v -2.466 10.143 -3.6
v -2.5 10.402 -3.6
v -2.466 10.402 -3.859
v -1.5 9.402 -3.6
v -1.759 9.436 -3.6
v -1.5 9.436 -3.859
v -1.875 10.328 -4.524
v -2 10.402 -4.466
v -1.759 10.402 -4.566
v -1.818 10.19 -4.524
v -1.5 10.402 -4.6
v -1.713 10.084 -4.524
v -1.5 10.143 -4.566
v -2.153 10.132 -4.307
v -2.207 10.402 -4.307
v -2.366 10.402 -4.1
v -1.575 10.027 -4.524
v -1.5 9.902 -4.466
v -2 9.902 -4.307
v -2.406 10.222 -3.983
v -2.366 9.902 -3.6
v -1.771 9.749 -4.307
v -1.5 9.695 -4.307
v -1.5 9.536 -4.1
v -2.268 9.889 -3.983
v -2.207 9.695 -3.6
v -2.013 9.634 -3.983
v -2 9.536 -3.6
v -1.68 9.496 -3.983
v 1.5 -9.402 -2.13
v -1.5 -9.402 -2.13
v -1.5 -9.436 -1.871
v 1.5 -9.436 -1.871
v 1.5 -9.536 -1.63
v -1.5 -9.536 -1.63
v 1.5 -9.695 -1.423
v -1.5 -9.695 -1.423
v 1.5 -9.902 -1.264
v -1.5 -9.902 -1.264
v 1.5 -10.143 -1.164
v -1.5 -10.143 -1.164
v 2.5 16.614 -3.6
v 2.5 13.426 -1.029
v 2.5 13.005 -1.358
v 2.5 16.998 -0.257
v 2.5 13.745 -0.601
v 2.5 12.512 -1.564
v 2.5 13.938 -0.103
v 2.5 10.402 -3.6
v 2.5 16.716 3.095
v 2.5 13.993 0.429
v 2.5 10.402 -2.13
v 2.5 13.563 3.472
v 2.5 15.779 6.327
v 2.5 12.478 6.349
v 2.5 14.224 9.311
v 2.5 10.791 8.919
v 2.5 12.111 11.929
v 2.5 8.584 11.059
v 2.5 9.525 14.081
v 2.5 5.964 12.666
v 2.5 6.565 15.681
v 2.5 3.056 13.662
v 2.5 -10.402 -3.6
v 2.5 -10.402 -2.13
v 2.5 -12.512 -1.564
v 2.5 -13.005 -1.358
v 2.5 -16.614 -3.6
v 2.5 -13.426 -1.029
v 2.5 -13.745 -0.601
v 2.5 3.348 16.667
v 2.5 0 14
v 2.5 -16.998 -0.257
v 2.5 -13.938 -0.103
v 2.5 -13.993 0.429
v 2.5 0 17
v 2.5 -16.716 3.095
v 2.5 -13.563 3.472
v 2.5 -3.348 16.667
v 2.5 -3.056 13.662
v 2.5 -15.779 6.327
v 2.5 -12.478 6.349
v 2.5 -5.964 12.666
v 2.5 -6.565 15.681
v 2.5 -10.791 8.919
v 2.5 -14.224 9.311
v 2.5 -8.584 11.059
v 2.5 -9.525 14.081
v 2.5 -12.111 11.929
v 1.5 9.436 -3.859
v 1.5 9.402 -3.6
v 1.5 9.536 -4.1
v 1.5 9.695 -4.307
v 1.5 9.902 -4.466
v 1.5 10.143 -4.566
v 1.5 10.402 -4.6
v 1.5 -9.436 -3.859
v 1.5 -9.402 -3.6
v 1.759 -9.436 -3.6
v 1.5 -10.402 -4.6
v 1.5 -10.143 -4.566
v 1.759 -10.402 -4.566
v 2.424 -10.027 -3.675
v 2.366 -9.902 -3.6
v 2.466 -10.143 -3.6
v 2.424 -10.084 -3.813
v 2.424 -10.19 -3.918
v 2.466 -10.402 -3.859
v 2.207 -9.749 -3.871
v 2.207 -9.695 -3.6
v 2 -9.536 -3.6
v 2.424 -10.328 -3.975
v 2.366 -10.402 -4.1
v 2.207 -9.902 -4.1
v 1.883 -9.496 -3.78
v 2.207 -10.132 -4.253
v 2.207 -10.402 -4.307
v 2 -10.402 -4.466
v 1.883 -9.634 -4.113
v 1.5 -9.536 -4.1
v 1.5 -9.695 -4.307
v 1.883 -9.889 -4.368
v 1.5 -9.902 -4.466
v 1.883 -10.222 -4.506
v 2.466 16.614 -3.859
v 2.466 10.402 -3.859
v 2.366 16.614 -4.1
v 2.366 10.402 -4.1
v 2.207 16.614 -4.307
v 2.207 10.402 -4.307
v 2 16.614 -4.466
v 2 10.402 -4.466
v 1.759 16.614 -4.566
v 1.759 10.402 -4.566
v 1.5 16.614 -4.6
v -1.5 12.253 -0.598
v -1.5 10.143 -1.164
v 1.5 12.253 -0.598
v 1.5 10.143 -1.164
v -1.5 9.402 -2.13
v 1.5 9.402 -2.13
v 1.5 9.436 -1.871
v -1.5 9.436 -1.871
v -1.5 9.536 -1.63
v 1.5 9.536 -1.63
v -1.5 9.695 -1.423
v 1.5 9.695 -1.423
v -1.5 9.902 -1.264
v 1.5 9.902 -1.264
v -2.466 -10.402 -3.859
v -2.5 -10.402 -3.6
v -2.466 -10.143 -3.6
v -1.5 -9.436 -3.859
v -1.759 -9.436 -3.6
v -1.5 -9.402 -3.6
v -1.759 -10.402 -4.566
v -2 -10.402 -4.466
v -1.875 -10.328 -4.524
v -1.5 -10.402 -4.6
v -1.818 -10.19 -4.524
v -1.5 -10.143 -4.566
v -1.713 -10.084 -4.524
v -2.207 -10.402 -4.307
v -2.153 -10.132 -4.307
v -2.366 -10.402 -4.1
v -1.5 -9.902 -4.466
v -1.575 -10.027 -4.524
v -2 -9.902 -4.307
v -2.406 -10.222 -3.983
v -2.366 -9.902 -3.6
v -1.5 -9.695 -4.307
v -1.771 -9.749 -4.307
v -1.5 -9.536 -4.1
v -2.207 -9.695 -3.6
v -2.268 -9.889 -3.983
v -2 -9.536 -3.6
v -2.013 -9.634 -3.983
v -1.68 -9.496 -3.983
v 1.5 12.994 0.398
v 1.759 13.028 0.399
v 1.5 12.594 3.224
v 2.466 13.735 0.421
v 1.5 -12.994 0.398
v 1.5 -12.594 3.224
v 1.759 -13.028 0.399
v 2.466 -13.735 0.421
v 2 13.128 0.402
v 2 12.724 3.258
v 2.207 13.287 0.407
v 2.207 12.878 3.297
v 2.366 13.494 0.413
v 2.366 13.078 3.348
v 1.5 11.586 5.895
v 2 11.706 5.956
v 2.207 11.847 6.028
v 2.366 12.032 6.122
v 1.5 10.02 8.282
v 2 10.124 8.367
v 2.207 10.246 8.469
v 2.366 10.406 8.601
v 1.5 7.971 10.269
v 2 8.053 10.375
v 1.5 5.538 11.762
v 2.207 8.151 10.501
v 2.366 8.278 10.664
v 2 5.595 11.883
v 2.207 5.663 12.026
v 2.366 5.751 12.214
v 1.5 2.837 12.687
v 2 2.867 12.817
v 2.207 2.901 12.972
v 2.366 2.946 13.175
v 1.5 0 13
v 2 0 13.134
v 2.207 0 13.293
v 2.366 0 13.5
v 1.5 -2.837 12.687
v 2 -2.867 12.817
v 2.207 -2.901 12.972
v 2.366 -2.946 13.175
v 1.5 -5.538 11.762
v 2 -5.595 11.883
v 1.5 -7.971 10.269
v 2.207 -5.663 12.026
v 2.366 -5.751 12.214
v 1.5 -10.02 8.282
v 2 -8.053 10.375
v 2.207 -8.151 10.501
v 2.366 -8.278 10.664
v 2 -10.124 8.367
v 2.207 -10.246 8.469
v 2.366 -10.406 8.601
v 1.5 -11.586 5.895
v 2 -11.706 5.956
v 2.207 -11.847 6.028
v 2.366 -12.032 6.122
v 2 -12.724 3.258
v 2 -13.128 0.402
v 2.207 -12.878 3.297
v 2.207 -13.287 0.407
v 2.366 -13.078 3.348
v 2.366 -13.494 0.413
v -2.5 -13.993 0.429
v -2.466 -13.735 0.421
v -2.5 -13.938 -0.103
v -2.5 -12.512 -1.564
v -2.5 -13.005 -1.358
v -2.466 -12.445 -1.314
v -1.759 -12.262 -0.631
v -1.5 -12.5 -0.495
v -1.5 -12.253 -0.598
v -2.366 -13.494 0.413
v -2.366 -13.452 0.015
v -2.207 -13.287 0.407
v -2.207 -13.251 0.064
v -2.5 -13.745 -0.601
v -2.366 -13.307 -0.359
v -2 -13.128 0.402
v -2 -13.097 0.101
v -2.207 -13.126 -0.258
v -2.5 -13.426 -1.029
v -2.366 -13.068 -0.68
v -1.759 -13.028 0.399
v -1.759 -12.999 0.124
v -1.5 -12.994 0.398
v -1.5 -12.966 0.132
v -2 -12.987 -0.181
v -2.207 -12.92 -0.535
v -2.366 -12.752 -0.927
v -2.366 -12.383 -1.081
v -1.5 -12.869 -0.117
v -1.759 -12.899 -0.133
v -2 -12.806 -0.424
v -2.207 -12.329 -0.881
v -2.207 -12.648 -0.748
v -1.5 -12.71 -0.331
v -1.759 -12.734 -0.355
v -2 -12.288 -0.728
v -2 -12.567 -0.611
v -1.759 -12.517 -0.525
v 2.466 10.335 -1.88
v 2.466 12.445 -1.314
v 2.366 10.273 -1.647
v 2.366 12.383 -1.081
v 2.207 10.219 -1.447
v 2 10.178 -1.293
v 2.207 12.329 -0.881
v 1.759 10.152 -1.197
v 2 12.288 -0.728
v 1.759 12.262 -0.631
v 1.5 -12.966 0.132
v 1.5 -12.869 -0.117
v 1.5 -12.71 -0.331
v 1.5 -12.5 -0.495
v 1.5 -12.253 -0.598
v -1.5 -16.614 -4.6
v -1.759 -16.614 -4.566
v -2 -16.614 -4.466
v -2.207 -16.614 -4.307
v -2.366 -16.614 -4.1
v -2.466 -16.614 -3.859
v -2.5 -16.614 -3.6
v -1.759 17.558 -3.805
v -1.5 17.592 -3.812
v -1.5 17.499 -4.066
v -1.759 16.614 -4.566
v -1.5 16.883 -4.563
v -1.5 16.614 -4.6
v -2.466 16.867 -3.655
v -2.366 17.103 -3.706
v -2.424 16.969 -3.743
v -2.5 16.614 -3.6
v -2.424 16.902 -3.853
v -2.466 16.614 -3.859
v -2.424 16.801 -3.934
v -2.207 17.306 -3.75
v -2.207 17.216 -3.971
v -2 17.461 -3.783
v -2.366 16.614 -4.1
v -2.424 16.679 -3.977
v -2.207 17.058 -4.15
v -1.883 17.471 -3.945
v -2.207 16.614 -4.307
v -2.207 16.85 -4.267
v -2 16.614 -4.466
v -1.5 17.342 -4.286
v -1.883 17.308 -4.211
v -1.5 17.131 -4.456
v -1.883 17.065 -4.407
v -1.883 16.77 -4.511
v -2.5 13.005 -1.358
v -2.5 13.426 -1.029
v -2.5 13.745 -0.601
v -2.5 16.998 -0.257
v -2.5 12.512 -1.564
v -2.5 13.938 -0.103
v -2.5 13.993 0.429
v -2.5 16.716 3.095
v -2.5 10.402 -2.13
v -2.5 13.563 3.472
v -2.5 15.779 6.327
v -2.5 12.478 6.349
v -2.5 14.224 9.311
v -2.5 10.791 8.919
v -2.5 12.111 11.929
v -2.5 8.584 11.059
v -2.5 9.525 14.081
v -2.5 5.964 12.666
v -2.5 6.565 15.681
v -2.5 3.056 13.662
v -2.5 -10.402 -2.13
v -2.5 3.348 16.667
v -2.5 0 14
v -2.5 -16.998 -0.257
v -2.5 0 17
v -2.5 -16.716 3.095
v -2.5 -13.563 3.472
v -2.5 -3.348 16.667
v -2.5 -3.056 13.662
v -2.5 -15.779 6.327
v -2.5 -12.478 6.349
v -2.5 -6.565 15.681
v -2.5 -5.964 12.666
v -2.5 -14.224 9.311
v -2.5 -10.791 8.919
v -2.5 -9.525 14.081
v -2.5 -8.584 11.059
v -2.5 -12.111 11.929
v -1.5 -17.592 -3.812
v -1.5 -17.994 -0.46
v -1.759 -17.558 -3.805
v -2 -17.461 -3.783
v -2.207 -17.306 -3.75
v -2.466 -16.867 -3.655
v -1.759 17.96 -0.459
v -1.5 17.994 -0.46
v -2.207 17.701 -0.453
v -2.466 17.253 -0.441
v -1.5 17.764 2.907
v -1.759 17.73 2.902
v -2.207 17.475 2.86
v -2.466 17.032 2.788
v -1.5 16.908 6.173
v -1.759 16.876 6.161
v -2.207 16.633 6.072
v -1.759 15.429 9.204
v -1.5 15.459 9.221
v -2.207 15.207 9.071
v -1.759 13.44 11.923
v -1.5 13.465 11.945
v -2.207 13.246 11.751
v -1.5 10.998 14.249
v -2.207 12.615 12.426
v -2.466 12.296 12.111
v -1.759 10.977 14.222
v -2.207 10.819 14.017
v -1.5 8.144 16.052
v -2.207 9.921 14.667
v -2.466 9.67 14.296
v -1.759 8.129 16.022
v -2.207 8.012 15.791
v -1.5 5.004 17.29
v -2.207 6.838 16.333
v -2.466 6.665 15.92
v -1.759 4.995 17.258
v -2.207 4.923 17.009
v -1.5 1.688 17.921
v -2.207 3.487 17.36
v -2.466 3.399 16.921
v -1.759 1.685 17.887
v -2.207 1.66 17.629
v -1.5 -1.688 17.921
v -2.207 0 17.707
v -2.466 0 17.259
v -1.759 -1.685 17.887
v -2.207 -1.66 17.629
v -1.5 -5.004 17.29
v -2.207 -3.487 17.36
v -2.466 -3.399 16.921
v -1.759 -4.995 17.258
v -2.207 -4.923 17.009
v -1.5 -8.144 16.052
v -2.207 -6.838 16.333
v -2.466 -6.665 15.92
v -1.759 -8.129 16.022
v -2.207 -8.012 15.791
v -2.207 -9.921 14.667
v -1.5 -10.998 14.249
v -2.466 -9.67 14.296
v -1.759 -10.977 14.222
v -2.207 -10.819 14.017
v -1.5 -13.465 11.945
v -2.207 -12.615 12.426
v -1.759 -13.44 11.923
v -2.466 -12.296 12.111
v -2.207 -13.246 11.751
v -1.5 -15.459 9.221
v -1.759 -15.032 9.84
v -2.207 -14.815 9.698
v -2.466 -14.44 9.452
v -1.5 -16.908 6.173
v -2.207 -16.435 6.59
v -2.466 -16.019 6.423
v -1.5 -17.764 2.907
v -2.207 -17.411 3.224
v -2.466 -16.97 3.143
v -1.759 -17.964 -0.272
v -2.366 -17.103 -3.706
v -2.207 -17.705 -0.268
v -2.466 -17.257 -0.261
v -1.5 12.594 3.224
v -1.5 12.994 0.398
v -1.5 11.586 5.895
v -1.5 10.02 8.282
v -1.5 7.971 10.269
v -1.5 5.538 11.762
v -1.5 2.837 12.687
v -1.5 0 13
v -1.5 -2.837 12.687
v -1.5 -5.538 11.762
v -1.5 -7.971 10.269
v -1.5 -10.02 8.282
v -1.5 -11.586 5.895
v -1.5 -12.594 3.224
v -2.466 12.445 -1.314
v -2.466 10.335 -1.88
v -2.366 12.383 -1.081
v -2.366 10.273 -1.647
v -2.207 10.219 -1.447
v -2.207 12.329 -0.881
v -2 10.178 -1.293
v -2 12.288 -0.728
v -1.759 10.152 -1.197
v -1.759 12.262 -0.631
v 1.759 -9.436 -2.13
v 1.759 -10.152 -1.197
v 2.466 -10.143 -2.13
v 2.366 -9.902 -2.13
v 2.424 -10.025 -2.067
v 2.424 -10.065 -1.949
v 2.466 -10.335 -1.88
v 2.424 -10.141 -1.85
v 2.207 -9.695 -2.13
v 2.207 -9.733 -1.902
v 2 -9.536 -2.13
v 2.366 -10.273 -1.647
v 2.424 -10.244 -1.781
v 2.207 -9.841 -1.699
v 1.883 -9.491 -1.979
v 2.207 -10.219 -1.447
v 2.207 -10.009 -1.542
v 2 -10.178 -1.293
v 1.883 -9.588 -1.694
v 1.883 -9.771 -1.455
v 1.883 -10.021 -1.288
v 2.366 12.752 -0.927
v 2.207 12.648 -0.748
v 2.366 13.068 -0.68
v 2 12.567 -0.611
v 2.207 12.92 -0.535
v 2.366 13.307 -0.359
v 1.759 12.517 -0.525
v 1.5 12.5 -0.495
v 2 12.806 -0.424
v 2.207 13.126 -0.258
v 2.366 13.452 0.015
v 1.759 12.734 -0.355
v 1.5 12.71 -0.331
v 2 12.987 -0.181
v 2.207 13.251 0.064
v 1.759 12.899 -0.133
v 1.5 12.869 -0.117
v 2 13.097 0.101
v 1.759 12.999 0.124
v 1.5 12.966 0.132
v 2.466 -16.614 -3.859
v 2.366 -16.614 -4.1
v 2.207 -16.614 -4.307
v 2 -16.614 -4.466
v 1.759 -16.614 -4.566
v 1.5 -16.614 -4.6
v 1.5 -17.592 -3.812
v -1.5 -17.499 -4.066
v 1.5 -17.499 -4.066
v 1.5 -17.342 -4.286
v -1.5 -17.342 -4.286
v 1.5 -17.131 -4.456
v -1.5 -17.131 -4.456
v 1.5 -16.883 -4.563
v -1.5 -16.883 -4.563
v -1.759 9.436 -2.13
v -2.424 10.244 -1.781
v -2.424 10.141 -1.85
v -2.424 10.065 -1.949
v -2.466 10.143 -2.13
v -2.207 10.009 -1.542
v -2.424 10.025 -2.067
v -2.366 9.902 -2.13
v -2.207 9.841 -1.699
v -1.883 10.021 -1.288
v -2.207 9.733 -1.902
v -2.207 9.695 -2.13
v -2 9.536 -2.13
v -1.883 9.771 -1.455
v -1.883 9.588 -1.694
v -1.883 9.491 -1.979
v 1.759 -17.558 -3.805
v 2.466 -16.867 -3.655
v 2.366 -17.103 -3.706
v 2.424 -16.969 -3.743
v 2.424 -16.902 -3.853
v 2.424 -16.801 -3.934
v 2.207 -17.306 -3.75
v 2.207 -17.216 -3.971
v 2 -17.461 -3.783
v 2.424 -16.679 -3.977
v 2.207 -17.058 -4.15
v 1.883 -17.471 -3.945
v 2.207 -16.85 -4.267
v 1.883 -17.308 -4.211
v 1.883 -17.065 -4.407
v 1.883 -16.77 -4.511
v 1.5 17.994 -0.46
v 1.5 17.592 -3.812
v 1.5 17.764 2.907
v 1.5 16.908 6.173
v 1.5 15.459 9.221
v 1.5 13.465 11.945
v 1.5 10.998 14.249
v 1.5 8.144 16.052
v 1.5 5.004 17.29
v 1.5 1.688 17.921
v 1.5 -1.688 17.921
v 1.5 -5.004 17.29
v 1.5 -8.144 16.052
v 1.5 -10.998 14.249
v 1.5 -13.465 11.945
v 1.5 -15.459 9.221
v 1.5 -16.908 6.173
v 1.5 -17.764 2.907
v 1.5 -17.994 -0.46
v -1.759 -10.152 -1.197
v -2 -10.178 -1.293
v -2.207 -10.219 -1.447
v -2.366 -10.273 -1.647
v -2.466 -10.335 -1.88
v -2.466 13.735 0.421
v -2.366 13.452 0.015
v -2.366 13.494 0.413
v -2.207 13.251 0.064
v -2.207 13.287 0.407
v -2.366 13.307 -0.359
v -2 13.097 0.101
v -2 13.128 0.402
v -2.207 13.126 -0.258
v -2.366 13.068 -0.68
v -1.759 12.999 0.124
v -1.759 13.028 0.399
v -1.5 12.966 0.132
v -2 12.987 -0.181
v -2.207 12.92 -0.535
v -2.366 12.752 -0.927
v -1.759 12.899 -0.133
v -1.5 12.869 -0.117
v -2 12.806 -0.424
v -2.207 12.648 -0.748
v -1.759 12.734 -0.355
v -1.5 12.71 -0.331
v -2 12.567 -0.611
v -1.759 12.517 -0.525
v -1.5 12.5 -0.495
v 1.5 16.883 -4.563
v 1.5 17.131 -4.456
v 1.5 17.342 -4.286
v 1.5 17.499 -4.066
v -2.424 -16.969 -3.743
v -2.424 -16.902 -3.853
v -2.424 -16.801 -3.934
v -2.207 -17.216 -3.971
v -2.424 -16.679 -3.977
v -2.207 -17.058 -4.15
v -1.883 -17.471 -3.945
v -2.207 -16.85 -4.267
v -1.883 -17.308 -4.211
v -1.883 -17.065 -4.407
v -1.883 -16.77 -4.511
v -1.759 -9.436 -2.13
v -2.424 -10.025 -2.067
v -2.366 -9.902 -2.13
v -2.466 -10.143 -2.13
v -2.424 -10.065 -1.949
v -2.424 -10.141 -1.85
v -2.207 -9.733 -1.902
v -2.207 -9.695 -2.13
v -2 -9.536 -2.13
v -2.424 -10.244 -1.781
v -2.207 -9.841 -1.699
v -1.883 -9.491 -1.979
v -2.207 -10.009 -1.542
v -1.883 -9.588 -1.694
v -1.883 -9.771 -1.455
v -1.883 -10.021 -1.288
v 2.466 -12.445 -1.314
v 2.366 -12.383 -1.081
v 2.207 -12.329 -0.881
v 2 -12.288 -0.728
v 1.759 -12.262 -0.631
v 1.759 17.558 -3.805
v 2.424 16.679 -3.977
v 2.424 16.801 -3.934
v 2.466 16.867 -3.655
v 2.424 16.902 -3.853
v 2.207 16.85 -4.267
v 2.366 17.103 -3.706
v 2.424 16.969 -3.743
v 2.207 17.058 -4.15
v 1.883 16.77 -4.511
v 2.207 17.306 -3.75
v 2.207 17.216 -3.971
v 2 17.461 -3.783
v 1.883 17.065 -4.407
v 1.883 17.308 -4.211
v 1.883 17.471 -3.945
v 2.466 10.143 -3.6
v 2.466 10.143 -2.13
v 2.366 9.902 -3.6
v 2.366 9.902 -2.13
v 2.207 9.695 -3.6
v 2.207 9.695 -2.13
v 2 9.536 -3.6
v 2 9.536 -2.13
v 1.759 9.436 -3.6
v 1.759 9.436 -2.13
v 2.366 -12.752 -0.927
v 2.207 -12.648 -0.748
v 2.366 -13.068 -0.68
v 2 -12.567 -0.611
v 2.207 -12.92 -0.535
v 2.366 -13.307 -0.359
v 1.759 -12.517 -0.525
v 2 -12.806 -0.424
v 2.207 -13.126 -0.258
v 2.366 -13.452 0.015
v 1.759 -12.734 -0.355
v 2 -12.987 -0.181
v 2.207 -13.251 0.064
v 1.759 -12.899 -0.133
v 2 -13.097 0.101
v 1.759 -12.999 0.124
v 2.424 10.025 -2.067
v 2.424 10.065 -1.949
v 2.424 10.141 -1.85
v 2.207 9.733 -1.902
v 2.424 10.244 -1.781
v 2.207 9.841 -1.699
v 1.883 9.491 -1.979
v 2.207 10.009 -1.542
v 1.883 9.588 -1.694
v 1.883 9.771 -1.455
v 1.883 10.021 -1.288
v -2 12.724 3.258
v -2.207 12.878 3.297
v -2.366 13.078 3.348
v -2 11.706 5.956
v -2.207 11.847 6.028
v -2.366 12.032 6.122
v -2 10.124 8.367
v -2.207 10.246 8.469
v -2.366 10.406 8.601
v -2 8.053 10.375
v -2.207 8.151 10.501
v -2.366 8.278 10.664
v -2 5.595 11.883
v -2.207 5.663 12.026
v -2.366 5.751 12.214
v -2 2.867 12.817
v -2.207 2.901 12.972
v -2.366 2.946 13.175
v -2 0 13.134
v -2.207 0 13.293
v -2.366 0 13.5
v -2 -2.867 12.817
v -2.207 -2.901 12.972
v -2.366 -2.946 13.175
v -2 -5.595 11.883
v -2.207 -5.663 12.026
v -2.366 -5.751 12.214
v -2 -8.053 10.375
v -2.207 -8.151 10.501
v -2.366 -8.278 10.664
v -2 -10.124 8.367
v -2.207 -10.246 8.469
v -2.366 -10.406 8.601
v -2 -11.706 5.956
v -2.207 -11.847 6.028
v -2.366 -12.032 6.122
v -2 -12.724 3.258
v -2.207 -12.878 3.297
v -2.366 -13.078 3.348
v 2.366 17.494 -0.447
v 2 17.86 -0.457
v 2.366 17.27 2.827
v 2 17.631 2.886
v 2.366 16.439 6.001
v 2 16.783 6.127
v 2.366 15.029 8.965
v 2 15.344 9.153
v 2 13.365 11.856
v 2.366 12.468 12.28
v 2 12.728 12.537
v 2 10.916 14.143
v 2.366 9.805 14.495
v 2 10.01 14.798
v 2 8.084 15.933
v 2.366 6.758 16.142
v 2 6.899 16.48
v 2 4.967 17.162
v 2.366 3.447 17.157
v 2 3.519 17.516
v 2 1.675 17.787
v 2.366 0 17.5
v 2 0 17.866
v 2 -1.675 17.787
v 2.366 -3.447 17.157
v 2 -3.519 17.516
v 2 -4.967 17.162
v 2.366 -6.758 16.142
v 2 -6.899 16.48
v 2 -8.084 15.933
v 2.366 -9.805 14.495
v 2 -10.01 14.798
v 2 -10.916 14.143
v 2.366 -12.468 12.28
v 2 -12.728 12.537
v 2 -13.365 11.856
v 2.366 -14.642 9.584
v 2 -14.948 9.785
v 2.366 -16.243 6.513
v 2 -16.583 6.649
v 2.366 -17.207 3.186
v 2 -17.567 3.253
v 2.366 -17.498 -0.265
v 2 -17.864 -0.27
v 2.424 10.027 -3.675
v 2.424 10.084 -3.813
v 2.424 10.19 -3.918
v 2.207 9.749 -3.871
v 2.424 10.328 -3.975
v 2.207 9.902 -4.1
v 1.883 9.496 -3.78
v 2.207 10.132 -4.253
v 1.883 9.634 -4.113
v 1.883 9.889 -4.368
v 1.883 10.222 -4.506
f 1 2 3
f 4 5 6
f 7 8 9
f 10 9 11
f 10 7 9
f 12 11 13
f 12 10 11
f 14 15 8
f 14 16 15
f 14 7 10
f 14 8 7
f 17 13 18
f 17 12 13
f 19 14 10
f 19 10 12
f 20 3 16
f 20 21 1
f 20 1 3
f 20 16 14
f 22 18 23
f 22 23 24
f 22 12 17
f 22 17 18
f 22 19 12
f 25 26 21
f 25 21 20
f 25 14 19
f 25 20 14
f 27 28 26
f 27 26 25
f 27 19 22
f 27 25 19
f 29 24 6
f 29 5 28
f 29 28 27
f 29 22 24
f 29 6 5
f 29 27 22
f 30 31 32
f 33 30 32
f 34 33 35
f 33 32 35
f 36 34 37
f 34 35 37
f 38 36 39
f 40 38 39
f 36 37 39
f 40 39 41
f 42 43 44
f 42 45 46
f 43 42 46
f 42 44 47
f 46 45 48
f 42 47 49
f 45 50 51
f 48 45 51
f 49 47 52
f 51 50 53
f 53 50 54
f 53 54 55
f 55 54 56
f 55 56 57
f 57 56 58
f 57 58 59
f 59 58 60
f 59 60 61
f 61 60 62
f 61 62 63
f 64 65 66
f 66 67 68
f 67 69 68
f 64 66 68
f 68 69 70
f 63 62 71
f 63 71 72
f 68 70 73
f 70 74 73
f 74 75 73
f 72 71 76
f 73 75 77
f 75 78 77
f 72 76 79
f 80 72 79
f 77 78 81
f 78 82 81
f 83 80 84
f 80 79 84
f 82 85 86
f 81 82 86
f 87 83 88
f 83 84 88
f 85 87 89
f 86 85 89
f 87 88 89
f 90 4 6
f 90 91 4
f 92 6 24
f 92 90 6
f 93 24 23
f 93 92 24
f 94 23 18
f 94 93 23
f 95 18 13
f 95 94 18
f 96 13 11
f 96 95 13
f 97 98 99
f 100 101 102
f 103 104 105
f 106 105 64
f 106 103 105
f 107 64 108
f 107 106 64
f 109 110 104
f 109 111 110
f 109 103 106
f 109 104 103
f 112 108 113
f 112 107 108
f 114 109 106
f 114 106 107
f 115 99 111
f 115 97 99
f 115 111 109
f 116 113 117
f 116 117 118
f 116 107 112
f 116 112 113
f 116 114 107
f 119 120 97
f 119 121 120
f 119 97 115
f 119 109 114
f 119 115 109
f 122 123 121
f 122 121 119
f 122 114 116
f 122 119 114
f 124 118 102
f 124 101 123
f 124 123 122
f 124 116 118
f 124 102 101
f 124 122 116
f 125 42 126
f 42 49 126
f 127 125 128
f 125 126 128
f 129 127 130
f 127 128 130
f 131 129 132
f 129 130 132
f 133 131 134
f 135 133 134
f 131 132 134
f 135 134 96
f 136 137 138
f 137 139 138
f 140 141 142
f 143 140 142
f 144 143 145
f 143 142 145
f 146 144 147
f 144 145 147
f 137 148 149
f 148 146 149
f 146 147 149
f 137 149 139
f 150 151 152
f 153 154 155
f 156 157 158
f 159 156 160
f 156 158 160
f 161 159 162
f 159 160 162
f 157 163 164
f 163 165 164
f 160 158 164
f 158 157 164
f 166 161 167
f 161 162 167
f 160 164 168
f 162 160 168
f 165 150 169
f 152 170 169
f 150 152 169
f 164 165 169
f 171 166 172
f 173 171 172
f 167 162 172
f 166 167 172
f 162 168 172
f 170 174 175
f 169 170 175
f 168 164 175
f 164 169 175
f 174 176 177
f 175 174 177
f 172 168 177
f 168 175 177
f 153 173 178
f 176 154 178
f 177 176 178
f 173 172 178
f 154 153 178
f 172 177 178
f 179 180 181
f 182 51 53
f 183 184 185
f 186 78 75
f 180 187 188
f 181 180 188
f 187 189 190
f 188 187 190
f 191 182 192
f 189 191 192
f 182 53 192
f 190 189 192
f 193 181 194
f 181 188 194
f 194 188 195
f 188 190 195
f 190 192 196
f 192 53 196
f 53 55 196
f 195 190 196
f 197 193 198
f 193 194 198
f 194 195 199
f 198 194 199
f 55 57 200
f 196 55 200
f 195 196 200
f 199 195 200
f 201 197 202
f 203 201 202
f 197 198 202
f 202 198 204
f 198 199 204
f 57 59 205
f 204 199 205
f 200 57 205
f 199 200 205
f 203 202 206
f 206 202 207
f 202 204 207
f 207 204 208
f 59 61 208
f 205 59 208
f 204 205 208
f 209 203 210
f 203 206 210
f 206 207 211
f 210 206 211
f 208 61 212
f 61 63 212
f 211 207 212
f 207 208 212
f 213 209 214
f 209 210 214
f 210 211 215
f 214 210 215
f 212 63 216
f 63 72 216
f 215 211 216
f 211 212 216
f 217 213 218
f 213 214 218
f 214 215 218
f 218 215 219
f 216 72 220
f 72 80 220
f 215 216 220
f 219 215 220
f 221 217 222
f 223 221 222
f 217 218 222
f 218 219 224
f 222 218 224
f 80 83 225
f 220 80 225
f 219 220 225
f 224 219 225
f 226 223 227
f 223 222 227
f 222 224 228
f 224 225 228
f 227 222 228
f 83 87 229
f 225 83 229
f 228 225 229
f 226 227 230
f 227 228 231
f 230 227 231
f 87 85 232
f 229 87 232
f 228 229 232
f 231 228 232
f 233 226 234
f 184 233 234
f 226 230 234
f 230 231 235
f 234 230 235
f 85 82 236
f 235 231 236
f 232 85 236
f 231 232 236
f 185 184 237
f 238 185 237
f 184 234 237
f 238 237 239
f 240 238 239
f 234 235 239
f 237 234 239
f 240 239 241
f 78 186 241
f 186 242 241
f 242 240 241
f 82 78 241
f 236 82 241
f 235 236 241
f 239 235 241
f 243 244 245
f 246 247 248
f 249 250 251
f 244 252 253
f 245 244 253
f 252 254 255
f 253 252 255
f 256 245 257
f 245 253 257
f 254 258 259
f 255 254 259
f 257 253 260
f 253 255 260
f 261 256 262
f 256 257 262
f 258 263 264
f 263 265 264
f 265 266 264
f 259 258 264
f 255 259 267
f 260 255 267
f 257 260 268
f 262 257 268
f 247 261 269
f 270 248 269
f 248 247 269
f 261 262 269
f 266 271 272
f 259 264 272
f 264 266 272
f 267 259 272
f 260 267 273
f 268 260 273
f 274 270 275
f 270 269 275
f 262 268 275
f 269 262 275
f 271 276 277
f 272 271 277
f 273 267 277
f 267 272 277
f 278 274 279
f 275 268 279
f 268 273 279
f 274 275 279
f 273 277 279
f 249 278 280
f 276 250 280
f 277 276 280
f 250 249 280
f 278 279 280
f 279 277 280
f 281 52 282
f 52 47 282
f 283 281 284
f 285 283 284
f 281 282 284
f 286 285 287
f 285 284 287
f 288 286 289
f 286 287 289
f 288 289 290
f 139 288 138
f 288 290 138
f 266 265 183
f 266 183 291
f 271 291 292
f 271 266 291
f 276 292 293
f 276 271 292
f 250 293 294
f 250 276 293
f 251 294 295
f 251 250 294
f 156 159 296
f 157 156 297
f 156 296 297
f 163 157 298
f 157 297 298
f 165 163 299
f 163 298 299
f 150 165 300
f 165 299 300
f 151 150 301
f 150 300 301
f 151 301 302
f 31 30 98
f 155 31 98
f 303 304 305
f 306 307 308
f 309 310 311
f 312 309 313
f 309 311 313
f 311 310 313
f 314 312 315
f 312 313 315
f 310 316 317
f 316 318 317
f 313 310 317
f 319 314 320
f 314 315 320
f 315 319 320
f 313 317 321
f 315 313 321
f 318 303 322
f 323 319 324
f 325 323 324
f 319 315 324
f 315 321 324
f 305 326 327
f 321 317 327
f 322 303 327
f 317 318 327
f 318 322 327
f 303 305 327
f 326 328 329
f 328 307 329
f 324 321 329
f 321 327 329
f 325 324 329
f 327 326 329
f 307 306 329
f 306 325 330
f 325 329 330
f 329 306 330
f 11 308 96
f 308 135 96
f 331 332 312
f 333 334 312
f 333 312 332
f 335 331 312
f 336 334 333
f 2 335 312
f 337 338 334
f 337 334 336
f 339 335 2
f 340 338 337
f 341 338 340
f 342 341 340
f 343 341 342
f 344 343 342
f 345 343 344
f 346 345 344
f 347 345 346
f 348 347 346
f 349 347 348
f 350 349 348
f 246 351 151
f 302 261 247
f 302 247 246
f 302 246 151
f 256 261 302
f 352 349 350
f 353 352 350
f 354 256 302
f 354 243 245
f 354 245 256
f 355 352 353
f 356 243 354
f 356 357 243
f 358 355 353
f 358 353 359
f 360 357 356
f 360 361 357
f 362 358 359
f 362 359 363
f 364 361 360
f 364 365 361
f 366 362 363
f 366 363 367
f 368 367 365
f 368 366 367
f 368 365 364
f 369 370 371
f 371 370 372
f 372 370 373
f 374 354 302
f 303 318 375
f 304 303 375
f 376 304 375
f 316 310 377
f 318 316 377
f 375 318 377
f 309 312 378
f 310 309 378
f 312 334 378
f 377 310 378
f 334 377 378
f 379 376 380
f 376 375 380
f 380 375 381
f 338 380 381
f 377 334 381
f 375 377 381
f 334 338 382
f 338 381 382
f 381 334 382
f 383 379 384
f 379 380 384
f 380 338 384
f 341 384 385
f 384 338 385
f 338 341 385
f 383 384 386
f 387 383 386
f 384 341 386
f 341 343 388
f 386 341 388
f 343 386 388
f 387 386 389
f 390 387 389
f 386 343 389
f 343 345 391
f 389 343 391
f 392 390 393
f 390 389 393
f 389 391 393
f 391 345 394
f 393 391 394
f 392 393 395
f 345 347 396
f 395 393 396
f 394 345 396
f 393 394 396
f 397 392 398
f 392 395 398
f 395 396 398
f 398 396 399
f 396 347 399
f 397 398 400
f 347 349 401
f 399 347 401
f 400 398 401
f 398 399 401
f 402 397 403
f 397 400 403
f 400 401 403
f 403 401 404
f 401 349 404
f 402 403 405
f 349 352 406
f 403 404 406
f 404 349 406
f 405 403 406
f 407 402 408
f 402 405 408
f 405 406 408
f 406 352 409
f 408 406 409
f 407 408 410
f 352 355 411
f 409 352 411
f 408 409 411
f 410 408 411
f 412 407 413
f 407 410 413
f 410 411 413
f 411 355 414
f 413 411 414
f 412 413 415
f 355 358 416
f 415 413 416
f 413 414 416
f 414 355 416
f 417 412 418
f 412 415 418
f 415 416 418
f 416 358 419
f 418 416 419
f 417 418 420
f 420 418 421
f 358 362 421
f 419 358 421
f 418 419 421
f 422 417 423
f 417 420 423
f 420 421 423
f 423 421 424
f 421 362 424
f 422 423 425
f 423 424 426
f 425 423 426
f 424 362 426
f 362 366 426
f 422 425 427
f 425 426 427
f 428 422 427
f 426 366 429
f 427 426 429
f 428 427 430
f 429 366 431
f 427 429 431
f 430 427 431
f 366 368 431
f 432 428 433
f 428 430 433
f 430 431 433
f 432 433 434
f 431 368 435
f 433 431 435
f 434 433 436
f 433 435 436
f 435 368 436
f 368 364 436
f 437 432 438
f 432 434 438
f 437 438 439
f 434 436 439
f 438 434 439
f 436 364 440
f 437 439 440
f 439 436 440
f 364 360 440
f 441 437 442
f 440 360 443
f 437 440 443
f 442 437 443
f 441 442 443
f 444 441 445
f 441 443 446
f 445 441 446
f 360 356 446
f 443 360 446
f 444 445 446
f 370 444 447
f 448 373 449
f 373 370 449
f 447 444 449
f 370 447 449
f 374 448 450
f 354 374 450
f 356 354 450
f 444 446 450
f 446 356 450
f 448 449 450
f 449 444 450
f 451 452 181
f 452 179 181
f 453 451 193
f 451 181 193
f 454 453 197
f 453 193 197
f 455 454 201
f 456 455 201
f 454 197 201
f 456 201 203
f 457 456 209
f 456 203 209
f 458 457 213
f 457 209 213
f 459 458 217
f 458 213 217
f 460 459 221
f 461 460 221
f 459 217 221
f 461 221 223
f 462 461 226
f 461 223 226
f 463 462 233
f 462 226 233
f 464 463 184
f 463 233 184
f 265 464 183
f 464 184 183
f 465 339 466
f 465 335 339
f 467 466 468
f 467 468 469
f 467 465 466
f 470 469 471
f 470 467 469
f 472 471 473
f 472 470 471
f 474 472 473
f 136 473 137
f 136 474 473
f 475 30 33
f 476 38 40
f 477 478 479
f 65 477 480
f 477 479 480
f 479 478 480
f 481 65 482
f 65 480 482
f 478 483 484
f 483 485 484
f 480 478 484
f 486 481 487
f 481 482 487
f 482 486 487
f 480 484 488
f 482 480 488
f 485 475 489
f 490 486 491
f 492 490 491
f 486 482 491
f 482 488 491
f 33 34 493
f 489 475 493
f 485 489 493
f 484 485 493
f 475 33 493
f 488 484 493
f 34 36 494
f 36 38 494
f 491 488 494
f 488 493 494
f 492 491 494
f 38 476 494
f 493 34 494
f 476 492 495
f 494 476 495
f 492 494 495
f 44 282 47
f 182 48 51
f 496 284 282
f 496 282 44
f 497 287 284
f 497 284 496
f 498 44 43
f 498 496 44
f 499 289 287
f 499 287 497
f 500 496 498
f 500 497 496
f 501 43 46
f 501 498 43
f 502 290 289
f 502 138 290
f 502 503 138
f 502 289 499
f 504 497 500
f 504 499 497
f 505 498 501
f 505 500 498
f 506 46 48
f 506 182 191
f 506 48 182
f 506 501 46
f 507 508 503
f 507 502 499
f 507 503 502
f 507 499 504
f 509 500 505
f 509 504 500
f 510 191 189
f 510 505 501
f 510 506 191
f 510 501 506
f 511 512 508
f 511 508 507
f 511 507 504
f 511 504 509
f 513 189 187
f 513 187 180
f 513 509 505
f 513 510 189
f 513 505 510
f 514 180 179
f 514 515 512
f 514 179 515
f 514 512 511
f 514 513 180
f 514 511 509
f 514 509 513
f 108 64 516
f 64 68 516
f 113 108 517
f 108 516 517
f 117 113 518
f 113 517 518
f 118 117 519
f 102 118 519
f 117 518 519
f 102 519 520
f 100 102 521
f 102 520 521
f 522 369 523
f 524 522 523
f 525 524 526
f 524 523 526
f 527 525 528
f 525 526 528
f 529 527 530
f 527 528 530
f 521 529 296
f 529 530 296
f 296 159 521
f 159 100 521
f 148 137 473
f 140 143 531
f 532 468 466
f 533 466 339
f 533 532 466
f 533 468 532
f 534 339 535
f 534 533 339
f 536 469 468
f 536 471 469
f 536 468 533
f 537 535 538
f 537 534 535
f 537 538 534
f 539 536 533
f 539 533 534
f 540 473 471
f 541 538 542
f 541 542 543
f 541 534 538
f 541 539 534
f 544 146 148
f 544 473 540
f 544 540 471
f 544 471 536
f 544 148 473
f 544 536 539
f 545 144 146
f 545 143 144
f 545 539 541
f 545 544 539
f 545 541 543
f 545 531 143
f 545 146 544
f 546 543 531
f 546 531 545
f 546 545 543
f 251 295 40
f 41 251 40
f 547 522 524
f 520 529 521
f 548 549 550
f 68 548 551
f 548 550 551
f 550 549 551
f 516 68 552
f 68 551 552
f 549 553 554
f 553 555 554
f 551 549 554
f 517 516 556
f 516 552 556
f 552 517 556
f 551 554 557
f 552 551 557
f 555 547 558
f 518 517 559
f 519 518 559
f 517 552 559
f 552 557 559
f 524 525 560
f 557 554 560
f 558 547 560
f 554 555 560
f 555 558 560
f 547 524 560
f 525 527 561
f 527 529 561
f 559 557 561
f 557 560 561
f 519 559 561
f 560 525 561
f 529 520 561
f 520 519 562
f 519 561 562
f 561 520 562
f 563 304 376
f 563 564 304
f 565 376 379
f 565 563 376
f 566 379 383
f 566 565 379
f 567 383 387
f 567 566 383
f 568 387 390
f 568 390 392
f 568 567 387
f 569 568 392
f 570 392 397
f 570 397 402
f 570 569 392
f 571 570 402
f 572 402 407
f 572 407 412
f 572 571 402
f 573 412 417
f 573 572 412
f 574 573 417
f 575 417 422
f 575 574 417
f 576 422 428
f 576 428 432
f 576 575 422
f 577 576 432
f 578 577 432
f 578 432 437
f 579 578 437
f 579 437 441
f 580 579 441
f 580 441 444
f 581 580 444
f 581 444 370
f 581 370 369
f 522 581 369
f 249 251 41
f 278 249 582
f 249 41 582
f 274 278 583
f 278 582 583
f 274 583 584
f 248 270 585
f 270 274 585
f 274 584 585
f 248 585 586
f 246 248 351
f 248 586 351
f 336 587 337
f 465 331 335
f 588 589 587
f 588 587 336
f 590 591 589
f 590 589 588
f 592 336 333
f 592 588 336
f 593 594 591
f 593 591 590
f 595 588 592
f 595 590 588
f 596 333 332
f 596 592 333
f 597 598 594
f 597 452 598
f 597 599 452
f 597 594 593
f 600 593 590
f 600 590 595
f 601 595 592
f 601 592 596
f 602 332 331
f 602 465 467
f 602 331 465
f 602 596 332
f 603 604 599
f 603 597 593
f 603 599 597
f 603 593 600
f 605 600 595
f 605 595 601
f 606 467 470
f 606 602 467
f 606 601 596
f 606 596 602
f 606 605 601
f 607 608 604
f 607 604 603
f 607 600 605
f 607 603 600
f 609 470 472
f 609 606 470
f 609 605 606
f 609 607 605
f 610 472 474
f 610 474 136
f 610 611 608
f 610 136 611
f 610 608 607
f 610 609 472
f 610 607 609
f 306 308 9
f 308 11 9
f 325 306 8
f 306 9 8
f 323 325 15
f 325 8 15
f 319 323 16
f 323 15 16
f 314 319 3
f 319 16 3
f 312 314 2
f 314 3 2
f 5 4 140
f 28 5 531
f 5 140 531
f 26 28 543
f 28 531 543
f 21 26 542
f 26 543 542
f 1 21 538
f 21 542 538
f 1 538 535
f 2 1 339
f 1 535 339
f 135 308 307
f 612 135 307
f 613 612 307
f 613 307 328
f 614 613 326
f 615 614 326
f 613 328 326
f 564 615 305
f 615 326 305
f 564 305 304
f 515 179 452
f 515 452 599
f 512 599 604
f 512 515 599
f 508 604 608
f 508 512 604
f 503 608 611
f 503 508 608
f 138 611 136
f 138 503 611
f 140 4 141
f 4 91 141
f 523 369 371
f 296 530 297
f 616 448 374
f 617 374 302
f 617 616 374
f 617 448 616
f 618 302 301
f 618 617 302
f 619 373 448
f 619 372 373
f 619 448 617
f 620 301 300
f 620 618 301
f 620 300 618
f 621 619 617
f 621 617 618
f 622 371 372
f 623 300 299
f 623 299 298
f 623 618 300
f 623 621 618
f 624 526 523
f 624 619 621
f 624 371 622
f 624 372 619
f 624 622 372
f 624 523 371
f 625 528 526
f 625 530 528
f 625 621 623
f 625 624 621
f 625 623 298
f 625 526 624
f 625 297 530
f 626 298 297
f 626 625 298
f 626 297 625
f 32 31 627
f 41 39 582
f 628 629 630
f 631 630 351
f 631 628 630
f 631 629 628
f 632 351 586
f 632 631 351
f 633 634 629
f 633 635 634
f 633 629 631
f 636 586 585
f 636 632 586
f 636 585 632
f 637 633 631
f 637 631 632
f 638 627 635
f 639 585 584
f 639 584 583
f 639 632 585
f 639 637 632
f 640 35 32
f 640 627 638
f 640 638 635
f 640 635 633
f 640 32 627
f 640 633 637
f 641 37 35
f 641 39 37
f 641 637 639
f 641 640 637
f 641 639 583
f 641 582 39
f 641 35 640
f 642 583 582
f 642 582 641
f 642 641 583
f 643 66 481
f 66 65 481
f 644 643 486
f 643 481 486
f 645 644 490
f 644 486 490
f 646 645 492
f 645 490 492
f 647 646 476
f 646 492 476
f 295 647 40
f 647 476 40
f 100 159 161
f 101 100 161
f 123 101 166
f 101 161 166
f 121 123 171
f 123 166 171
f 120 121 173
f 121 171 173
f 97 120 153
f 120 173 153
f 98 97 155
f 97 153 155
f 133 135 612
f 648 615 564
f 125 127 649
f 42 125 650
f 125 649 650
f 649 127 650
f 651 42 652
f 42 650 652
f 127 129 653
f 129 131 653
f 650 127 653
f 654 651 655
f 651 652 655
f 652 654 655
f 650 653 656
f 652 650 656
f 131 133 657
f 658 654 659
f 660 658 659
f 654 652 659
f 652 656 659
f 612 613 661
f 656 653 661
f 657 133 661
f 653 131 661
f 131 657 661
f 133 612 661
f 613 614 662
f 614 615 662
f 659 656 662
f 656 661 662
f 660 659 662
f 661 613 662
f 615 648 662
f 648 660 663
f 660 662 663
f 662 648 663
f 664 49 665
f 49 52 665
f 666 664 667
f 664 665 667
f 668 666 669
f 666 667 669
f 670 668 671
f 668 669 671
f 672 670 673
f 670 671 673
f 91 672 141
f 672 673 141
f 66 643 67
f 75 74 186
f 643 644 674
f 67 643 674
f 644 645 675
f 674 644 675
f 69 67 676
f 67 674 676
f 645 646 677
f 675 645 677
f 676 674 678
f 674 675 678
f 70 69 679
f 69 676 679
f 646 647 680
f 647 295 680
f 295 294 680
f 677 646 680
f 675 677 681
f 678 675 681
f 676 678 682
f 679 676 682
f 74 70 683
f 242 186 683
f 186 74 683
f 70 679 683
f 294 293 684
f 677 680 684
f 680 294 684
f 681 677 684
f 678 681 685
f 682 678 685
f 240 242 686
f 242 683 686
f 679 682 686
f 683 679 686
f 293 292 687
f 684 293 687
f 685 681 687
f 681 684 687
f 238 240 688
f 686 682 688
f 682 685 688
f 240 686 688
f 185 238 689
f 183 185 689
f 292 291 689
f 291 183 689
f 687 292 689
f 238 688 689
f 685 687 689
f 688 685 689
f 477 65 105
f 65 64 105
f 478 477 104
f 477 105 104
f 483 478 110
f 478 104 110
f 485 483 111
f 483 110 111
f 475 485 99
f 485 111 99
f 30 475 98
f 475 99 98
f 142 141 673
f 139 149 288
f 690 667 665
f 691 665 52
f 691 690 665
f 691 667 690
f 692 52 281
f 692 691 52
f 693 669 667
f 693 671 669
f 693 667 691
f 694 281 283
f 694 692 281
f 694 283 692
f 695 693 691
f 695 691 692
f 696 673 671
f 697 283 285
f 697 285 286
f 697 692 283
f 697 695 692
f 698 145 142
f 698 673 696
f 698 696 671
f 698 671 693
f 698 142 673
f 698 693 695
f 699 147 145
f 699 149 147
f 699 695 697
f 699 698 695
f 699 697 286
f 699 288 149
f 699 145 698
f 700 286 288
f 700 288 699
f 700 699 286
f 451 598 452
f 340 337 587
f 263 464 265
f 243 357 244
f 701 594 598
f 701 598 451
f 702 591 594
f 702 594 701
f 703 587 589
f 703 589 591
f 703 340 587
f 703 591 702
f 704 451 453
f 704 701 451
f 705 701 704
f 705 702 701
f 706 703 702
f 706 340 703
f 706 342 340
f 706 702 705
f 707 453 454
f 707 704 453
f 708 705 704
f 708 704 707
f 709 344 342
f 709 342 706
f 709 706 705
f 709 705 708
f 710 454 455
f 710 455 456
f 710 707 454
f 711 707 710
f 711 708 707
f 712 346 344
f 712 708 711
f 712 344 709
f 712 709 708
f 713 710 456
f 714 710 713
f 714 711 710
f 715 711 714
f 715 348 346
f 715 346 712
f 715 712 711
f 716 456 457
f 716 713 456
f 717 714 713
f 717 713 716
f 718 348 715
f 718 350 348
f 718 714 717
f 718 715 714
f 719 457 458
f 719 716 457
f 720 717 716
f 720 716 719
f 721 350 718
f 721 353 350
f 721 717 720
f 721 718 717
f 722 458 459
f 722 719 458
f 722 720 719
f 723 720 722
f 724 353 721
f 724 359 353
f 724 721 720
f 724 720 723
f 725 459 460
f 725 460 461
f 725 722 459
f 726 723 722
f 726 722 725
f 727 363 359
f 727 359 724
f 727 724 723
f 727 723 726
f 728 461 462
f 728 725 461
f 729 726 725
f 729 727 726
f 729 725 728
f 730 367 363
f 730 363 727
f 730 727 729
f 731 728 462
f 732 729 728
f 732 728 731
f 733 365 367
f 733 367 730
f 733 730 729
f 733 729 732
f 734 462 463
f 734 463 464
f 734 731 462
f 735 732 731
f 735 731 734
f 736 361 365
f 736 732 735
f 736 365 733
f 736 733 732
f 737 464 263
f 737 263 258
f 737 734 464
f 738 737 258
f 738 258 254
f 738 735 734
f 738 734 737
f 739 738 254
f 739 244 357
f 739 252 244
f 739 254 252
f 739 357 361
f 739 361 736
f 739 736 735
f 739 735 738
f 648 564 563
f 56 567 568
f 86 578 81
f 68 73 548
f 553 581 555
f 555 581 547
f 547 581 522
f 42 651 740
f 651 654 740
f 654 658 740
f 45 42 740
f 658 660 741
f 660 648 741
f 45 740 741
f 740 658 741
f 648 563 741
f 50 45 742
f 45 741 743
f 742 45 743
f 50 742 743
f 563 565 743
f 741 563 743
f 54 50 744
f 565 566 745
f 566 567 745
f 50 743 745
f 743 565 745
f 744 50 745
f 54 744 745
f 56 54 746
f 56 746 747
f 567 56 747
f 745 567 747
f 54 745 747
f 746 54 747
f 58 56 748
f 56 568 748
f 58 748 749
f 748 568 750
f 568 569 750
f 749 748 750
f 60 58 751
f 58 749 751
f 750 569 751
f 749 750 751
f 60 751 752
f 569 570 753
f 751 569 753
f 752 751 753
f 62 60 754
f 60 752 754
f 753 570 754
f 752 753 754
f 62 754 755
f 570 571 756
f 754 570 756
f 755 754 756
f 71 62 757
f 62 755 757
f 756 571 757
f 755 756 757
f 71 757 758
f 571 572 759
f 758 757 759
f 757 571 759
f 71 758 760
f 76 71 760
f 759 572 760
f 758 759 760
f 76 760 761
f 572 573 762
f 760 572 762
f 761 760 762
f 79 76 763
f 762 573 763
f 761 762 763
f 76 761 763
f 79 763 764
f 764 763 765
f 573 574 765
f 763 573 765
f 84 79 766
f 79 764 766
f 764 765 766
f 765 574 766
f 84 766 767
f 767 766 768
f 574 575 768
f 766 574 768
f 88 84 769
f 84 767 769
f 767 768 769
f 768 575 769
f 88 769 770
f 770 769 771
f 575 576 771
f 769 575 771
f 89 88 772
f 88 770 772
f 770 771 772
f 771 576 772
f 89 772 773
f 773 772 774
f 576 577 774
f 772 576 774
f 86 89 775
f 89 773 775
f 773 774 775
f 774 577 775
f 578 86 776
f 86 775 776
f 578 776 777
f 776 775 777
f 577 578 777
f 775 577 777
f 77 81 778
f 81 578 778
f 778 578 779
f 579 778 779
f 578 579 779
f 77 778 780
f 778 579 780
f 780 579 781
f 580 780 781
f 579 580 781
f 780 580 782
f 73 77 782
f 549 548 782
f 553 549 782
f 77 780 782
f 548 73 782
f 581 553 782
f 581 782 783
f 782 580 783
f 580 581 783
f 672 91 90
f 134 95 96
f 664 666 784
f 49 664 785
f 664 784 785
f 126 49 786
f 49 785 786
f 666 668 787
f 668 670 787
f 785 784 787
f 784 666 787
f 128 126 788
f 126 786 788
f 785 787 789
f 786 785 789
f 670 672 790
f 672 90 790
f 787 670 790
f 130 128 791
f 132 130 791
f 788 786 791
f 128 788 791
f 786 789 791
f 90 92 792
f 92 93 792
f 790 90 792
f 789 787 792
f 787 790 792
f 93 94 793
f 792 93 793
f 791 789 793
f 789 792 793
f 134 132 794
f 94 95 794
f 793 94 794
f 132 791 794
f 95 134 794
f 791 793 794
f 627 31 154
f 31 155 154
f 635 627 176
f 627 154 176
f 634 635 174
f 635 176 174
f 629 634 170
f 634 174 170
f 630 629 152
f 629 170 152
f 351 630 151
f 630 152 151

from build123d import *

# Parameters (mm, degrees)
PAD_DEPTH = 2.5
FILLET_R  = 1


with BuildPart() as part:
    # Sketch → Pad (new body, symmetric)
    with BuildSketch(Plane.YZ):
        with BuildLine():
            ThreePointArc((12.993845, -0.4), (0, 13), (-12.993845, -0.4))
            Line((-12.993845, -0.4), (-9.402299, -1.362352))
            Line((-9.402299, -1.362352), (-9.402299, -4.6))
            Line((-9.402299, -4.6), (-17.402299, -4.6))
            ThreePointArc((17.402299, -4.6), (0, 18), (-17.402299, -4.6))
            Line((17.402299, -4.6), (9.402299, -4.6))
            Line((9.402299, -4.6), (9.402299, -1.362352))
            Line((9.402299, -1.362352), (12.993845, -0.4))
        make_face()
    extrude(amount=PAD_DEPTH, both=True)

    # Fillet
    fillet_edges = [part.edges().sort_by_distance(p)[0] for p in [
        (0, -9.402299, -1.362352),
        (-2.5, -9.402299, -2.981176),
        (-2.5, 0, 13),
        (-2.5, 0, 18),
        (-2.5, 11.198072, -0.881176),
        (-2.5, 9.402299, -2.981176),
        (-2.5, -11.198072, -0.881176),
        (-2.5, -13.402299, -4.6),
        (-2.5, 13.402299, -4.6),
        (2.5, 0, 18),
        (0, 17.402299, -4.6),
        (0, -9.402299, -4.6),
        (2.5, -9.402299, -2.981176),
        (2.5, 0, 13),
        (0, -12.993845, -0.4),
        (0, 12.993845, -0.4),
        (0, 9.402299, -1.362352),
        (0, 9.402299, -4.6),
        (2.5, 9.402299, -2.981176),
        (2.5, 11.198072, -0.881176),
        (2.5, -11.198072, -0.881176),
        (2.5, -13.402299, -4.6),
        (2.5, 13.402299, -4.6),
        (0, -17.402299, -4.6),
    ]]
    fillet(fillet_edges, radius=FILLET_R)


solid = part.part
